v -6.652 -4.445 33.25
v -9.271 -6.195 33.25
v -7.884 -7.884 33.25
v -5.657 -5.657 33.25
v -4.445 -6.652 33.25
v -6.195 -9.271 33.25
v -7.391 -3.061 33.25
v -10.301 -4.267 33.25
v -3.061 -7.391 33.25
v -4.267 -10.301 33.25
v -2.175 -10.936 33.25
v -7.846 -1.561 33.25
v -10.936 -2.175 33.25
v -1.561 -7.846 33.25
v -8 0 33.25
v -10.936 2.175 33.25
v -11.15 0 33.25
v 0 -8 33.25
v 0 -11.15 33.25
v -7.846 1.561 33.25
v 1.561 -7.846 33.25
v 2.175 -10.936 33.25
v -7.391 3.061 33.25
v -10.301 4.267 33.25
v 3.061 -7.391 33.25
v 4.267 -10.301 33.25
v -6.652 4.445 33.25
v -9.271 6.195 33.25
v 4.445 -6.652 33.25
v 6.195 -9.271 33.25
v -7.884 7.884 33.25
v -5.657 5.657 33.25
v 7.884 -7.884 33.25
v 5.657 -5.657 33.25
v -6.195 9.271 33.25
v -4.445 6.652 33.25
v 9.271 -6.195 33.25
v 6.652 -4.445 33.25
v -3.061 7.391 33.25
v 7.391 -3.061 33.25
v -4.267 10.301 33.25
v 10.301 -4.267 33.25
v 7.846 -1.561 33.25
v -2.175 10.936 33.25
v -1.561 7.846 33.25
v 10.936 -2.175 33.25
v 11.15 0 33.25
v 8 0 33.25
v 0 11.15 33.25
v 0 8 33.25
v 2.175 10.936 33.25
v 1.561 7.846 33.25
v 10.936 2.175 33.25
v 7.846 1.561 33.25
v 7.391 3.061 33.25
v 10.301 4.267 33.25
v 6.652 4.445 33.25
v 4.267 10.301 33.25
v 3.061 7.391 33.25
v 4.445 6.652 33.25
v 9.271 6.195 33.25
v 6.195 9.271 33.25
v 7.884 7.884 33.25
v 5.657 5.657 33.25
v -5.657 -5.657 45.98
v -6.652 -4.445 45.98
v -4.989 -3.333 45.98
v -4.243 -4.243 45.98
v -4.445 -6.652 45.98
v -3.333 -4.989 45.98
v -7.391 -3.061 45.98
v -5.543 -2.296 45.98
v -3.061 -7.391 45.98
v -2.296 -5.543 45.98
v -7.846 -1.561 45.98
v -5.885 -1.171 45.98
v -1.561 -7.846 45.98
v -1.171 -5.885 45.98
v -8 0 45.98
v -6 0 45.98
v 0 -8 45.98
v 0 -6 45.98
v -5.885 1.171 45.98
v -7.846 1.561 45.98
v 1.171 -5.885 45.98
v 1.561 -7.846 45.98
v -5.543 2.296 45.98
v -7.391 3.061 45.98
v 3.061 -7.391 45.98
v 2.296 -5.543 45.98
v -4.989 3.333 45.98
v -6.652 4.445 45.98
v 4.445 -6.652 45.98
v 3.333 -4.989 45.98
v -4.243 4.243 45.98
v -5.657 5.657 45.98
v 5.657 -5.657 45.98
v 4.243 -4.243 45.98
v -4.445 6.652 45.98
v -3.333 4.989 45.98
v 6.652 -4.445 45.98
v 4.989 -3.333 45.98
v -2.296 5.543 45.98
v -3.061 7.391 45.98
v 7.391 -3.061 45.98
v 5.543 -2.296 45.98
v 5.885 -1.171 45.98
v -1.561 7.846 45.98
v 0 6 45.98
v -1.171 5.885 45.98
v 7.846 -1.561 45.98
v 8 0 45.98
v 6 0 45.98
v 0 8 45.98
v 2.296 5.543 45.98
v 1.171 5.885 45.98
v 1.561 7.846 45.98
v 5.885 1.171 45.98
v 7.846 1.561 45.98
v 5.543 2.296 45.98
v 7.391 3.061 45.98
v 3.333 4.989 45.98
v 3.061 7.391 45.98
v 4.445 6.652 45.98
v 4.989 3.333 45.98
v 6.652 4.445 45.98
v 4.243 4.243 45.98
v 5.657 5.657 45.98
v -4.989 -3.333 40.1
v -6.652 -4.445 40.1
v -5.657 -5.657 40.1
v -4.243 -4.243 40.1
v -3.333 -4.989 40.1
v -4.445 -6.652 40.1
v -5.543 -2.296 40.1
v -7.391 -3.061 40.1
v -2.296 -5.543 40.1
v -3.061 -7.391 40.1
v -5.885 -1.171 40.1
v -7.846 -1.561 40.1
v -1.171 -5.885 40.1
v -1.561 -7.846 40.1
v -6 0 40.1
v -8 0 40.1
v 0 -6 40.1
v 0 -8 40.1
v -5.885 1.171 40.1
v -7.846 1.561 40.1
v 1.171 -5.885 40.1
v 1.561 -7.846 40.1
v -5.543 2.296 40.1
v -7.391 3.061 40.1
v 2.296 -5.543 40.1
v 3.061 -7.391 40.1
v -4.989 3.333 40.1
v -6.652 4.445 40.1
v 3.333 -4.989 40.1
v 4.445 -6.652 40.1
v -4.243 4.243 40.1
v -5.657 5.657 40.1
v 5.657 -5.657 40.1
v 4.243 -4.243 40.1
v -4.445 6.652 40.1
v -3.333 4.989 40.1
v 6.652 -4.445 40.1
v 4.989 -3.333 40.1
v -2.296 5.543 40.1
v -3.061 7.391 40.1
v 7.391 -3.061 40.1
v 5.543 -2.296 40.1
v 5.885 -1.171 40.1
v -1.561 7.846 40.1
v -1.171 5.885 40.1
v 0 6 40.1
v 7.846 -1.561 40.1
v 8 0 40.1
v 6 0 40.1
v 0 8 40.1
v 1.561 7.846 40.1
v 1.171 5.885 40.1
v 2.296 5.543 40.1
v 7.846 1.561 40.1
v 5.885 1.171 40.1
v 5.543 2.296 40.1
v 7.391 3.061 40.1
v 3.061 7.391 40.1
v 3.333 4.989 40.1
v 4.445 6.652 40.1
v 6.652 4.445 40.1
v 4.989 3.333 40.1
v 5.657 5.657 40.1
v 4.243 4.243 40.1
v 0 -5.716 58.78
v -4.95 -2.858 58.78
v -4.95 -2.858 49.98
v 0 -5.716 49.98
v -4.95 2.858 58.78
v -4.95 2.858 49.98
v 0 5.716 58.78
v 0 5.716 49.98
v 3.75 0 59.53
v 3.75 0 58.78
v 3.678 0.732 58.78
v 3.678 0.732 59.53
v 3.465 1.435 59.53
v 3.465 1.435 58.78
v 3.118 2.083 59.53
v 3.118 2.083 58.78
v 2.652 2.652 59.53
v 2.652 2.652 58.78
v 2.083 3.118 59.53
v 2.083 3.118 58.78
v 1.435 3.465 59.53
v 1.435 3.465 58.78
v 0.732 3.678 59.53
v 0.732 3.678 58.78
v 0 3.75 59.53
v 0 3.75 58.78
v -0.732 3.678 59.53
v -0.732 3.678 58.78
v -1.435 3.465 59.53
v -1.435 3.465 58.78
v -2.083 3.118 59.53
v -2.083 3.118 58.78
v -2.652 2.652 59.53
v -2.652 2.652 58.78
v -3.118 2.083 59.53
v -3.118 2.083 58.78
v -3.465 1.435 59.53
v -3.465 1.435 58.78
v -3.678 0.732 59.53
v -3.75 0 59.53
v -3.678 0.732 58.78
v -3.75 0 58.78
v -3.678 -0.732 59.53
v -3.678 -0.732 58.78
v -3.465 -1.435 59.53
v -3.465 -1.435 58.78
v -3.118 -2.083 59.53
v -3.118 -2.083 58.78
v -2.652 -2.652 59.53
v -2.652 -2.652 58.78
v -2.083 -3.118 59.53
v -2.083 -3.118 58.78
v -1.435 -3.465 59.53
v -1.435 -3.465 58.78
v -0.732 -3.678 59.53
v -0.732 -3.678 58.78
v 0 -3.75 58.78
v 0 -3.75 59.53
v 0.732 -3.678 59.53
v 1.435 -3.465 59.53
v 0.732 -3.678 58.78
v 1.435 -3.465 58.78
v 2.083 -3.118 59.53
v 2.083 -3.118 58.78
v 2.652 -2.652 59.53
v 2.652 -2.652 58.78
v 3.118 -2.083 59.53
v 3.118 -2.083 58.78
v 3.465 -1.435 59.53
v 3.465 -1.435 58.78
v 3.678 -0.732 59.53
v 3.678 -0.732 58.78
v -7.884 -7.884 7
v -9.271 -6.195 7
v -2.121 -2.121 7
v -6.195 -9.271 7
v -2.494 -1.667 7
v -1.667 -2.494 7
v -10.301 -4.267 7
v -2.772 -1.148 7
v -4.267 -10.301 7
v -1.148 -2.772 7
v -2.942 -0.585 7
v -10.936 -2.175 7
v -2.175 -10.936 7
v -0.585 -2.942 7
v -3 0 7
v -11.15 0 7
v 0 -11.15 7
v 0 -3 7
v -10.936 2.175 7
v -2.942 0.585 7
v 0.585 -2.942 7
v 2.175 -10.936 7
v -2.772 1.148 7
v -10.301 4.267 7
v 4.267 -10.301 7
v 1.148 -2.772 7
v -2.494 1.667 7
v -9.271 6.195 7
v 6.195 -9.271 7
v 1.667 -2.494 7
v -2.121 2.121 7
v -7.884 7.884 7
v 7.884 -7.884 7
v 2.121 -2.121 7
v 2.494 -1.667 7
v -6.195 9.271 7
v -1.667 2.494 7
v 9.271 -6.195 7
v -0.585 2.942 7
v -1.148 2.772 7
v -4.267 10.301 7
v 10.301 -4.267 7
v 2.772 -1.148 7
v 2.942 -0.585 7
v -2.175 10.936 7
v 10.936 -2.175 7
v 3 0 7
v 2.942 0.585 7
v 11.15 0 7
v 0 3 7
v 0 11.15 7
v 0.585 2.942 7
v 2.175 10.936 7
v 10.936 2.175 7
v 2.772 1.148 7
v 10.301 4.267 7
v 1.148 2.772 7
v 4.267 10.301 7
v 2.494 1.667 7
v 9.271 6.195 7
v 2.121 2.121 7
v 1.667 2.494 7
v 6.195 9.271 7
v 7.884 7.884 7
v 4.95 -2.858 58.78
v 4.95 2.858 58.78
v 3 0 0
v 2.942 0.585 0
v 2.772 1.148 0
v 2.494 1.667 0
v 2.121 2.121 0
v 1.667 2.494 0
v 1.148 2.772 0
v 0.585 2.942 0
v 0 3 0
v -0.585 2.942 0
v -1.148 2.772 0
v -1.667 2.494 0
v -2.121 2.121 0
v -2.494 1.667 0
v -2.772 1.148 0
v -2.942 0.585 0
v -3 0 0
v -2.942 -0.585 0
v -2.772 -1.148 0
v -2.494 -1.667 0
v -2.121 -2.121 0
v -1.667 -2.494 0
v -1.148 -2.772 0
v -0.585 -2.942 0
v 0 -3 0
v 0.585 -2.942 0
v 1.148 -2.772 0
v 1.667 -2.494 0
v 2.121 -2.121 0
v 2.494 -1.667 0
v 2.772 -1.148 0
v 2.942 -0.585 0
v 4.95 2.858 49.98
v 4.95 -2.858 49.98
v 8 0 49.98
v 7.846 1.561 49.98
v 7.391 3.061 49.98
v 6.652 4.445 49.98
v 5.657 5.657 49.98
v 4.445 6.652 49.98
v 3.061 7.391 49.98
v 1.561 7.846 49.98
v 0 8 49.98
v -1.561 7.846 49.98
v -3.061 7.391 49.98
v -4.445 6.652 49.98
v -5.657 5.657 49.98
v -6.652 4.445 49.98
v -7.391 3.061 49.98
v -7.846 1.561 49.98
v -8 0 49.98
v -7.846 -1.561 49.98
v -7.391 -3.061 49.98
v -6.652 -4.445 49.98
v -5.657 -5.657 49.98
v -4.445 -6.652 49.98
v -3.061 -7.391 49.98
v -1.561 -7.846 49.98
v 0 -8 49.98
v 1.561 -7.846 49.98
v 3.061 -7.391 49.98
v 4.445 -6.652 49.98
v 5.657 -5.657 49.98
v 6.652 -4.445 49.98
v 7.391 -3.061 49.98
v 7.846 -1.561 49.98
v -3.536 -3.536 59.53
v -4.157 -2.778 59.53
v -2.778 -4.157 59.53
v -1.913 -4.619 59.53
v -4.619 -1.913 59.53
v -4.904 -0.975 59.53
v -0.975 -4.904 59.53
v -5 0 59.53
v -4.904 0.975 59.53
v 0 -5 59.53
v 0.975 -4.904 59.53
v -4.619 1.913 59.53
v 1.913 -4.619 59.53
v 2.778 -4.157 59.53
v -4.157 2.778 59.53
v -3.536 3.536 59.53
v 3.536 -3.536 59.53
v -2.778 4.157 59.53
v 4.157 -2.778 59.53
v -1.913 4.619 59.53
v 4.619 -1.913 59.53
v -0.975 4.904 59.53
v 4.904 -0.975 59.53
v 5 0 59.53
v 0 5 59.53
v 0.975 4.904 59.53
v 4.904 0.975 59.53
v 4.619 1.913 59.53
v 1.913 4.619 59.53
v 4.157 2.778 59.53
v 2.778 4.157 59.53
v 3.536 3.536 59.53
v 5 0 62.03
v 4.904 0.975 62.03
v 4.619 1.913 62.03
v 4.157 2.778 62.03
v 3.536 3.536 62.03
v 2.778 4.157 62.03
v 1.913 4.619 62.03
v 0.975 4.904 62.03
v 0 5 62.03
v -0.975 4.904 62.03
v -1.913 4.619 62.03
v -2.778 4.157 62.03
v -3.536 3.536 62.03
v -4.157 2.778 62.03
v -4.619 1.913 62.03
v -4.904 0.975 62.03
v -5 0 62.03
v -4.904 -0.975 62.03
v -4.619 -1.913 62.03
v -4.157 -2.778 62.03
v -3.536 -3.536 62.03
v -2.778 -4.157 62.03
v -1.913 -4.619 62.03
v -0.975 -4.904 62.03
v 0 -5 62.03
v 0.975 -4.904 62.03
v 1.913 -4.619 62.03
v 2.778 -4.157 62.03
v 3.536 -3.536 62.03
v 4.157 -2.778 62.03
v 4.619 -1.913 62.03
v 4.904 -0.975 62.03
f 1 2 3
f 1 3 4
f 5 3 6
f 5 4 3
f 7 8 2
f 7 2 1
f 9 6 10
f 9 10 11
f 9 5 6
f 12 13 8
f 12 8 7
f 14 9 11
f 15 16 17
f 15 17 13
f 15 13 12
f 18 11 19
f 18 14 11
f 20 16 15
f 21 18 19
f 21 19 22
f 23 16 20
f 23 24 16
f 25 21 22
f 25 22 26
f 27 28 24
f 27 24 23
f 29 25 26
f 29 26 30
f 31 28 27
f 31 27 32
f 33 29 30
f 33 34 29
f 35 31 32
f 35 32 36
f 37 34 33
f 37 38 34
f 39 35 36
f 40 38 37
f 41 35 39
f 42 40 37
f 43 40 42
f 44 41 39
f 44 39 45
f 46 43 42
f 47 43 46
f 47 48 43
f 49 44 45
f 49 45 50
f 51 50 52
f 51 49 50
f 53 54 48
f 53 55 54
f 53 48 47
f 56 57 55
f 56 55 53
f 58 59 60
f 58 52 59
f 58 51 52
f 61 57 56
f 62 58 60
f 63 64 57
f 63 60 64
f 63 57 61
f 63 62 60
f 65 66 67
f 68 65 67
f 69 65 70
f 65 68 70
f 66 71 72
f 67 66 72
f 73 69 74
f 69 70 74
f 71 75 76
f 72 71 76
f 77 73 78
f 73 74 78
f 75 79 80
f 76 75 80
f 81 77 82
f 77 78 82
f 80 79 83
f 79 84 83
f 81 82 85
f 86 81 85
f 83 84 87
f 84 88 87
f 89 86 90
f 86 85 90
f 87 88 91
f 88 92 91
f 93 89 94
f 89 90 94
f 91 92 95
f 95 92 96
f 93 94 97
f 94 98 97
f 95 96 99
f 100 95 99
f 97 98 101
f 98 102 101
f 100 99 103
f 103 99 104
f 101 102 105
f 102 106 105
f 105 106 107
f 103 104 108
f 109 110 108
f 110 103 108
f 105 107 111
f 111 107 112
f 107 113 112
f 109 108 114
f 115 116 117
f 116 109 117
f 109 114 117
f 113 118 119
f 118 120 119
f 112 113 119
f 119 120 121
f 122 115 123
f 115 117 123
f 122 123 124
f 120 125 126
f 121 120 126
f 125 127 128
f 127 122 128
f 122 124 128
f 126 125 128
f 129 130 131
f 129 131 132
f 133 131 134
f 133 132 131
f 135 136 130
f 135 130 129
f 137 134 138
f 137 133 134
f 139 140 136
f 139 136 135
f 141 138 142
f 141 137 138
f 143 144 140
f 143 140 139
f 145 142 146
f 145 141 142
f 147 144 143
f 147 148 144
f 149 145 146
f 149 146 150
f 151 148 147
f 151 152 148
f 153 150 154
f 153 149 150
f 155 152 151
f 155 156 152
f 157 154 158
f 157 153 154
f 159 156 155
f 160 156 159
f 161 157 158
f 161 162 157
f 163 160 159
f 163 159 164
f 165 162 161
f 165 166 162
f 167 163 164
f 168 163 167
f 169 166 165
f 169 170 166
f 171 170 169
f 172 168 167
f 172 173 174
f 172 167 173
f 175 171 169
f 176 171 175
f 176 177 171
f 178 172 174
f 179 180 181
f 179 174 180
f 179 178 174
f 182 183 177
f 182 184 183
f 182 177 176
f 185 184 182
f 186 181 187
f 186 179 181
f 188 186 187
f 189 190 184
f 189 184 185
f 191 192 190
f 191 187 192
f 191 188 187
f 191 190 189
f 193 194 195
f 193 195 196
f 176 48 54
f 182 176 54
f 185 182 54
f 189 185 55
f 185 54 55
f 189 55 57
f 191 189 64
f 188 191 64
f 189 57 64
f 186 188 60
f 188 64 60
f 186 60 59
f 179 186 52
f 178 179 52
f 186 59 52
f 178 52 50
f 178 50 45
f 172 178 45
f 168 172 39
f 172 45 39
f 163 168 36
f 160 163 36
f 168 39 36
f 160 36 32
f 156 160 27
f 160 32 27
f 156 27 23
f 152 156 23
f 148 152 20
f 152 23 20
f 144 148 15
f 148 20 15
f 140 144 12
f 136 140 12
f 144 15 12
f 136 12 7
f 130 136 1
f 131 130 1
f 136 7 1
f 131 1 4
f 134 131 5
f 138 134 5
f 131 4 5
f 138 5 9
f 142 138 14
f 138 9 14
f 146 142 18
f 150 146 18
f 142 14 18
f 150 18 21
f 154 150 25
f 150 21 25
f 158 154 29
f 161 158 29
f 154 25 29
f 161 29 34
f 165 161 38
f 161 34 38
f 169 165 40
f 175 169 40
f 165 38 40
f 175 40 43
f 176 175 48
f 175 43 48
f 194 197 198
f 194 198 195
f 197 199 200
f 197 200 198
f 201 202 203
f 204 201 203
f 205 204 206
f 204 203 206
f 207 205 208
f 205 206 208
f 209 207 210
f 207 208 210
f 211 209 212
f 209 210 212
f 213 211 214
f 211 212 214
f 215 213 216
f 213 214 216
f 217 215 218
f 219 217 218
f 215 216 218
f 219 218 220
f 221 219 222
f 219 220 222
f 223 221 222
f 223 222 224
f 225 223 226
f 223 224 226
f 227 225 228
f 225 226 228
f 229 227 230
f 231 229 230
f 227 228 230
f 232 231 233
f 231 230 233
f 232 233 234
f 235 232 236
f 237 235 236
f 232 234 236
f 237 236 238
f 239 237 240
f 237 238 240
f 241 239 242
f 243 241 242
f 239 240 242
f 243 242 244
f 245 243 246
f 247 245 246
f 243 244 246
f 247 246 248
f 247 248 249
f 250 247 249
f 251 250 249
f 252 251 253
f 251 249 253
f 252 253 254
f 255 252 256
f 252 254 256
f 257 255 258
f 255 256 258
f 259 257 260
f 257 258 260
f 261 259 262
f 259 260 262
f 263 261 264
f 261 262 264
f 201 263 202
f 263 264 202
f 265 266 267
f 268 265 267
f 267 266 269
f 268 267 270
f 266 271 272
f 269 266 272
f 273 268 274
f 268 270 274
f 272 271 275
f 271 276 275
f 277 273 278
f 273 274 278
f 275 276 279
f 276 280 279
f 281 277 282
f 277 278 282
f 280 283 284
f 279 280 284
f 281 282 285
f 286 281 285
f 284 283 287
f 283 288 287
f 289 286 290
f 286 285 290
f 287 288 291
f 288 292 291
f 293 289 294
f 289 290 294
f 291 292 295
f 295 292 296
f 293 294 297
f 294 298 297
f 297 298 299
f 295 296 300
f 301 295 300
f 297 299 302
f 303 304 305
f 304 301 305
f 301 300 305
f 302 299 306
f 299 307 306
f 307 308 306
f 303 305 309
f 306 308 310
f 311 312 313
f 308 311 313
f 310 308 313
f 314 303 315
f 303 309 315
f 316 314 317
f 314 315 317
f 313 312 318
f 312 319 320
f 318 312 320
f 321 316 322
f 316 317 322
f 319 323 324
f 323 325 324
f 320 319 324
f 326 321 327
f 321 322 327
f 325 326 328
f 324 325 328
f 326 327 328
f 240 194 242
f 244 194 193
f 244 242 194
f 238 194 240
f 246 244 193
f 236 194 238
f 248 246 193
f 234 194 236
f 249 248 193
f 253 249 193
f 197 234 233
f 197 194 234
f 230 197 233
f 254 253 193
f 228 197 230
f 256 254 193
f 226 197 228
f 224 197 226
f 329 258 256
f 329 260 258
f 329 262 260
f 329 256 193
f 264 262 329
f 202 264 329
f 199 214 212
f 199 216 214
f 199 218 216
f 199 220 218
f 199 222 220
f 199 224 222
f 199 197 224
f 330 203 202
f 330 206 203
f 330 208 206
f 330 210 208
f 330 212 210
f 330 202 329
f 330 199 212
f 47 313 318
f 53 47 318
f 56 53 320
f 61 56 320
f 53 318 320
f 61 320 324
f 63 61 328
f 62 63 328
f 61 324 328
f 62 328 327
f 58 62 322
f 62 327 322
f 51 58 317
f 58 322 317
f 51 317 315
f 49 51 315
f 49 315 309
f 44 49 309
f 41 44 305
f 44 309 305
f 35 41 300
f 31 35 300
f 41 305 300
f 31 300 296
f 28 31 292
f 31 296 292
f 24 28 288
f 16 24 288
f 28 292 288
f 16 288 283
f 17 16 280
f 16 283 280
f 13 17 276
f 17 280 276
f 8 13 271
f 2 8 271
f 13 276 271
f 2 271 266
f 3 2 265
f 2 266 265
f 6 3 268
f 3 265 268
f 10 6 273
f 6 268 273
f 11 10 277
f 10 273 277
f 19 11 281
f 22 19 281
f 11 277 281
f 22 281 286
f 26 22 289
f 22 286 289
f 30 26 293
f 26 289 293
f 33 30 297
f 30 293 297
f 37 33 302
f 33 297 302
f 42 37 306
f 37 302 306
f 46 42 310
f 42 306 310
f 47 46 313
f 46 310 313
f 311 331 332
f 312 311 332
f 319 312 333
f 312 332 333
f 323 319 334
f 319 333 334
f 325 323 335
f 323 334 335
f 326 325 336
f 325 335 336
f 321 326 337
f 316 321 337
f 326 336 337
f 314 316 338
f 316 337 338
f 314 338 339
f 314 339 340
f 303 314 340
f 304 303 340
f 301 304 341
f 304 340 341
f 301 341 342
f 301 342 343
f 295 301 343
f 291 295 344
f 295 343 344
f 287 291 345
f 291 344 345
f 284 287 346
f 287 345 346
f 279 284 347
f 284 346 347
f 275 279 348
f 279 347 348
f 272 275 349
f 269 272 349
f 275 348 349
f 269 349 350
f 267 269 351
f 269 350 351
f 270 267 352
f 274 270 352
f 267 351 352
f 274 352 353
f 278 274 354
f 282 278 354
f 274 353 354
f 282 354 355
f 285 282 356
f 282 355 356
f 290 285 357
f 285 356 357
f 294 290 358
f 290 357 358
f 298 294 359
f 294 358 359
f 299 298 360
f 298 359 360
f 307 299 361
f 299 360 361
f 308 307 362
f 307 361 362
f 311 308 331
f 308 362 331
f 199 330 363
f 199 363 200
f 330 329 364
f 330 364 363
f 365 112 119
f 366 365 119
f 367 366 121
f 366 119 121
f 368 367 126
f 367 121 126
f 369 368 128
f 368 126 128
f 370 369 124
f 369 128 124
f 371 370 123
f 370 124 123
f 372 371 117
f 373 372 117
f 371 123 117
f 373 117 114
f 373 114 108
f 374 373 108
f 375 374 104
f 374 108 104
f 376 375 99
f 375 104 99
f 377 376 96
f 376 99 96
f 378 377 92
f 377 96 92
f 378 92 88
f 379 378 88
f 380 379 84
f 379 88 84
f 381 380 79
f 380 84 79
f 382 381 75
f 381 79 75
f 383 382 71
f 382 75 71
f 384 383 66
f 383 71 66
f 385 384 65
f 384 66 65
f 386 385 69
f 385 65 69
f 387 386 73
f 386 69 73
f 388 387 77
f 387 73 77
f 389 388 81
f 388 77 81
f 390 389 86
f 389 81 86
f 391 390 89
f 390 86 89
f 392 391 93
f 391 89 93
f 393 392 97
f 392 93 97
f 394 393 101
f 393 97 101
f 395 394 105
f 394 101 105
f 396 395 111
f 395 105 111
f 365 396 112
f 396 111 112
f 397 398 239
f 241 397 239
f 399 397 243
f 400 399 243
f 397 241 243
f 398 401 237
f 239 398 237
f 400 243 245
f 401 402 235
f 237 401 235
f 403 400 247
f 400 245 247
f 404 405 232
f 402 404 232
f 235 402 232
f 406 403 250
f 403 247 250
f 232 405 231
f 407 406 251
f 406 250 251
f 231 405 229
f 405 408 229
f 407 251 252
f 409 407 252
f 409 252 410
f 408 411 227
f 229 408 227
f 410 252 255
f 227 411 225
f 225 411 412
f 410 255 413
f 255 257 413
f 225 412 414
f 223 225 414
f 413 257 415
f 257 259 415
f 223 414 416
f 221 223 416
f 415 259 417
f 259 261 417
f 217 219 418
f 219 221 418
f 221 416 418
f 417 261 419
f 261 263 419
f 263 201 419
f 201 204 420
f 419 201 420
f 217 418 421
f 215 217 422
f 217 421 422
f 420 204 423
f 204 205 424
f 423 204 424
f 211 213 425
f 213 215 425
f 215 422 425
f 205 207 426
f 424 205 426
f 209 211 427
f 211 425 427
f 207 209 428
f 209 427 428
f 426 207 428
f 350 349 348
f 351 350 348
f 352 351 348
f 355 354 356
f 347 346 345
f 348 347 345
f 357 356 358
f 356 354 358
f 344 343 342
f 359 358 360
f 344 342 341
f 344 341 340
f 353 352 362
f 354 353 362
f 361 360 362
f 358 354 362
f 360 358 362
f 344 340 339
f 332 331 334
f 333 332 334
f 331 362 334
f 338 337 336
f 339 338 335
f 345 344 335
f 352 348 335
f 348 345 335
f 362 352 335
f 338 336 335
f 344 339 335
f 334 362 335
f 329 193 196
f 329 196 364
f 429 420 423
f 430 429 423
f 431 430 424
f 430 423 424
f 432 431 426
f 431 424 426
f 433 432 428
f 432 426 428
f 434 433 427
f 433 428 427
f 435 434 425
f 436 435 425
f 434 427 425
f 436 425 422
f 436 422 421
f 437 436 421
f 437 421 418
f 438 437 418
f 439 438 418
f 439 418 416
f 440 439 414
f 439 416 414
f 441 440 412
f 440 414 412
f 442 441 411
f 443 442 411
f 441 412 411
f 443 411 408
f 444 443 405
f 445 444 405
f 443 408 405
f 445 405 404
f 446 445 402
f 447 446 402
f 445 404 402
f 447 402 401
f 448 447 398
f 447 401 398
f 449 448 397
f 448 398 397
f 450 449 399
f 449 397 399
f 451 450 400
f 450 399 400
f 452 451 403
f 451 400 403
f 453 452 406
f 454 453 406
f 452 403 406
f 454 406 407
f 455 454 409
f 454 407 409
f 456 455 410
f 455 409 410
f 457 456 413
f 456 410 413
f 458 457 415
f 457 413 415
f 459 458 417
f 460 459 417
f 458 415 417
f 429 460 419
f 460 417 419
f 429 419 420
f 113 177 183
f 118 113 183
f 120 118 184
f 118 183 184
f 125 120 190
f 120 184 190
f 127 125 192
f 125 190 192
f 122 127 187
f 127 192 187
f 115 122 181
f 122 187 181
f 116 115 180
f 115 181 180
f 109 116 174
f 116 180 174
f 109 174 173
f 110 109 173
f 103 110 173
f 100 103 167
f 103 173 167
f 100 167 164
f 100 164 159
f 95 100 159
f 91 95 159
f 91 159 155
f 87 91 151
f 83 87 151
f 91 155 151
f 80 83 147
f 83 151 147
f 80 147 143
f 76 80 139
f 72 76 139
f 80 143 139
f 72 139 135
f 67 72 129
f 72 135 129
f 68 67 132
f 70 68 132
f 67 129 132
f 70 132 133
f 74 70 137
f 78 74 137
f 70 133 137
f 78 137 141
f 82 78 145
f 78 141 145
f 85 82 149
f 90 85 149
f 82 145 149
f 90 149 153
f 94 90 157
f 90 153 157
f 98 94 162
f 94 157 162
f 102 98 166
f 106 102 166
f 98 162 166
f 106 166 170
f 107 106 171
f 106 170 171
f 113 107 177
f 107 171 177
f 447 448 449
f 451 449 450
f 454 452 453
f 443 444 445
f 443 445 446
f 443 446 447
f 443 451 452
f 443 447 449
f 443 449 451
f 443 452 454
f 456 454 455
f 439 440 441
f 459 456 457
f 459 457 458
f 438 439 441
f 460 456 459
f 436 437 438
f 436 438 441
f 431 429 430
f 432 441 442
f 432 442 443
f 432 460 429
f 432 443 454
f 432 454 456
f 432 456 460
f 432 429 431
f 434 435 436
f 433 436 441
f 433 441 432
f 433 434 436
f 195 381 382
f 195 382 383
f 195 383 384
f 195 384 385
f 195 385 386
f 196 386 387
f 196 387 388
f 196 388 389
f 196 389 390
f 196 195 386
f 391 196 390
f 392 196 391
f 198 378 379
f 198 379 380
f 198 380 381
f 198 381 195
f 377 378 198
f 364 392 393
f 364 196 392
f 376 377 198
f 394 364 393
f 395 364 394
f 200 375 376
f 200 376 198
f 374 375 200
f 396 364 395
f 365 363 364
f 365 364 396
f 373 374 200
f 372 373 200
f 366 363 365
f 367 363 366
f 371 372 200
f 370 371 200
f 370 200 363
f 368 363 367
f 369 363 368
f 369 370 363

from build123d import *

# Parameters (mm, degrees)
F0_R      = 3
F1_DEPTH  = 7
F2_R      = 11.15
F3_DEPTH  = 26.25
F4_R      = 8
F5_DEPTH  = 6.85
F6_R      = 6
F7_DEPTH  = 5.88
F8_R      = 8
F9_DEPTH  = 4
F11_DEPTH = 8.8
F12_R     = 3.75
F13_DEPTH = 0.75
F14_R     = 5
F15_DEPTH = 2.5


with BuildPart() as f1:
    # F0 (on Top) → F1 (new body)
    with BuildSketch(Plane.XY):
        Circle(F0_R)
    extrude(amount=F1_DEPTH)

    # F2 (on face) → F3 (join)
    with BuildSketch(Plane.XY.offset(7)):
        Circle(F2_R)
    extrude(amount=F3_DEPTH)

    # F4 (on face) → F5 (join)
    with BuildSketch(Plane.XY.offset(33.25)):
        Circle(F4_R)
    extrude(amount=F5_DEPTH)

    # F6 (on face) → F7 (join)
    with BuildSketch(Plane.XY.offset(40.1)):
        Circle(F6_R)
    extrude(amount=F7_DEPTH)

    # F8 (on face) → F9 (join)
    with BuildSketch(Plane.XY.offset(45.98)):
        Circle(F8_R)
    extrude(amount=F9_DEPTH)

    # F10 (on face) → F11 (join)
    with BuildSketch(Plane.XY.offset(49.98)):
        Polygon((-4.95, 2.8578838325), (-4.95, -2.8578838325), (0, -5.715767665), (4.95, -2.8578838325), (4.95, 2.8578838325), (0, 5.715767665), align=None)
    extrude(amount=F11_DEPTH)

    # F12 (on face) → F13 (join)
    with BuildSketch(Plane.XY.offset(58.78)):
        Circle(F12_R)
    extrude(amount=F13_DEPTH)

    # F14 (on face) → F15 (join)
    with BuildSketch(Plane.XY.offset(59.53)):
        Circle(F14_R)
    extrude(amount=F15_DEPTH)


solid = f1.part
